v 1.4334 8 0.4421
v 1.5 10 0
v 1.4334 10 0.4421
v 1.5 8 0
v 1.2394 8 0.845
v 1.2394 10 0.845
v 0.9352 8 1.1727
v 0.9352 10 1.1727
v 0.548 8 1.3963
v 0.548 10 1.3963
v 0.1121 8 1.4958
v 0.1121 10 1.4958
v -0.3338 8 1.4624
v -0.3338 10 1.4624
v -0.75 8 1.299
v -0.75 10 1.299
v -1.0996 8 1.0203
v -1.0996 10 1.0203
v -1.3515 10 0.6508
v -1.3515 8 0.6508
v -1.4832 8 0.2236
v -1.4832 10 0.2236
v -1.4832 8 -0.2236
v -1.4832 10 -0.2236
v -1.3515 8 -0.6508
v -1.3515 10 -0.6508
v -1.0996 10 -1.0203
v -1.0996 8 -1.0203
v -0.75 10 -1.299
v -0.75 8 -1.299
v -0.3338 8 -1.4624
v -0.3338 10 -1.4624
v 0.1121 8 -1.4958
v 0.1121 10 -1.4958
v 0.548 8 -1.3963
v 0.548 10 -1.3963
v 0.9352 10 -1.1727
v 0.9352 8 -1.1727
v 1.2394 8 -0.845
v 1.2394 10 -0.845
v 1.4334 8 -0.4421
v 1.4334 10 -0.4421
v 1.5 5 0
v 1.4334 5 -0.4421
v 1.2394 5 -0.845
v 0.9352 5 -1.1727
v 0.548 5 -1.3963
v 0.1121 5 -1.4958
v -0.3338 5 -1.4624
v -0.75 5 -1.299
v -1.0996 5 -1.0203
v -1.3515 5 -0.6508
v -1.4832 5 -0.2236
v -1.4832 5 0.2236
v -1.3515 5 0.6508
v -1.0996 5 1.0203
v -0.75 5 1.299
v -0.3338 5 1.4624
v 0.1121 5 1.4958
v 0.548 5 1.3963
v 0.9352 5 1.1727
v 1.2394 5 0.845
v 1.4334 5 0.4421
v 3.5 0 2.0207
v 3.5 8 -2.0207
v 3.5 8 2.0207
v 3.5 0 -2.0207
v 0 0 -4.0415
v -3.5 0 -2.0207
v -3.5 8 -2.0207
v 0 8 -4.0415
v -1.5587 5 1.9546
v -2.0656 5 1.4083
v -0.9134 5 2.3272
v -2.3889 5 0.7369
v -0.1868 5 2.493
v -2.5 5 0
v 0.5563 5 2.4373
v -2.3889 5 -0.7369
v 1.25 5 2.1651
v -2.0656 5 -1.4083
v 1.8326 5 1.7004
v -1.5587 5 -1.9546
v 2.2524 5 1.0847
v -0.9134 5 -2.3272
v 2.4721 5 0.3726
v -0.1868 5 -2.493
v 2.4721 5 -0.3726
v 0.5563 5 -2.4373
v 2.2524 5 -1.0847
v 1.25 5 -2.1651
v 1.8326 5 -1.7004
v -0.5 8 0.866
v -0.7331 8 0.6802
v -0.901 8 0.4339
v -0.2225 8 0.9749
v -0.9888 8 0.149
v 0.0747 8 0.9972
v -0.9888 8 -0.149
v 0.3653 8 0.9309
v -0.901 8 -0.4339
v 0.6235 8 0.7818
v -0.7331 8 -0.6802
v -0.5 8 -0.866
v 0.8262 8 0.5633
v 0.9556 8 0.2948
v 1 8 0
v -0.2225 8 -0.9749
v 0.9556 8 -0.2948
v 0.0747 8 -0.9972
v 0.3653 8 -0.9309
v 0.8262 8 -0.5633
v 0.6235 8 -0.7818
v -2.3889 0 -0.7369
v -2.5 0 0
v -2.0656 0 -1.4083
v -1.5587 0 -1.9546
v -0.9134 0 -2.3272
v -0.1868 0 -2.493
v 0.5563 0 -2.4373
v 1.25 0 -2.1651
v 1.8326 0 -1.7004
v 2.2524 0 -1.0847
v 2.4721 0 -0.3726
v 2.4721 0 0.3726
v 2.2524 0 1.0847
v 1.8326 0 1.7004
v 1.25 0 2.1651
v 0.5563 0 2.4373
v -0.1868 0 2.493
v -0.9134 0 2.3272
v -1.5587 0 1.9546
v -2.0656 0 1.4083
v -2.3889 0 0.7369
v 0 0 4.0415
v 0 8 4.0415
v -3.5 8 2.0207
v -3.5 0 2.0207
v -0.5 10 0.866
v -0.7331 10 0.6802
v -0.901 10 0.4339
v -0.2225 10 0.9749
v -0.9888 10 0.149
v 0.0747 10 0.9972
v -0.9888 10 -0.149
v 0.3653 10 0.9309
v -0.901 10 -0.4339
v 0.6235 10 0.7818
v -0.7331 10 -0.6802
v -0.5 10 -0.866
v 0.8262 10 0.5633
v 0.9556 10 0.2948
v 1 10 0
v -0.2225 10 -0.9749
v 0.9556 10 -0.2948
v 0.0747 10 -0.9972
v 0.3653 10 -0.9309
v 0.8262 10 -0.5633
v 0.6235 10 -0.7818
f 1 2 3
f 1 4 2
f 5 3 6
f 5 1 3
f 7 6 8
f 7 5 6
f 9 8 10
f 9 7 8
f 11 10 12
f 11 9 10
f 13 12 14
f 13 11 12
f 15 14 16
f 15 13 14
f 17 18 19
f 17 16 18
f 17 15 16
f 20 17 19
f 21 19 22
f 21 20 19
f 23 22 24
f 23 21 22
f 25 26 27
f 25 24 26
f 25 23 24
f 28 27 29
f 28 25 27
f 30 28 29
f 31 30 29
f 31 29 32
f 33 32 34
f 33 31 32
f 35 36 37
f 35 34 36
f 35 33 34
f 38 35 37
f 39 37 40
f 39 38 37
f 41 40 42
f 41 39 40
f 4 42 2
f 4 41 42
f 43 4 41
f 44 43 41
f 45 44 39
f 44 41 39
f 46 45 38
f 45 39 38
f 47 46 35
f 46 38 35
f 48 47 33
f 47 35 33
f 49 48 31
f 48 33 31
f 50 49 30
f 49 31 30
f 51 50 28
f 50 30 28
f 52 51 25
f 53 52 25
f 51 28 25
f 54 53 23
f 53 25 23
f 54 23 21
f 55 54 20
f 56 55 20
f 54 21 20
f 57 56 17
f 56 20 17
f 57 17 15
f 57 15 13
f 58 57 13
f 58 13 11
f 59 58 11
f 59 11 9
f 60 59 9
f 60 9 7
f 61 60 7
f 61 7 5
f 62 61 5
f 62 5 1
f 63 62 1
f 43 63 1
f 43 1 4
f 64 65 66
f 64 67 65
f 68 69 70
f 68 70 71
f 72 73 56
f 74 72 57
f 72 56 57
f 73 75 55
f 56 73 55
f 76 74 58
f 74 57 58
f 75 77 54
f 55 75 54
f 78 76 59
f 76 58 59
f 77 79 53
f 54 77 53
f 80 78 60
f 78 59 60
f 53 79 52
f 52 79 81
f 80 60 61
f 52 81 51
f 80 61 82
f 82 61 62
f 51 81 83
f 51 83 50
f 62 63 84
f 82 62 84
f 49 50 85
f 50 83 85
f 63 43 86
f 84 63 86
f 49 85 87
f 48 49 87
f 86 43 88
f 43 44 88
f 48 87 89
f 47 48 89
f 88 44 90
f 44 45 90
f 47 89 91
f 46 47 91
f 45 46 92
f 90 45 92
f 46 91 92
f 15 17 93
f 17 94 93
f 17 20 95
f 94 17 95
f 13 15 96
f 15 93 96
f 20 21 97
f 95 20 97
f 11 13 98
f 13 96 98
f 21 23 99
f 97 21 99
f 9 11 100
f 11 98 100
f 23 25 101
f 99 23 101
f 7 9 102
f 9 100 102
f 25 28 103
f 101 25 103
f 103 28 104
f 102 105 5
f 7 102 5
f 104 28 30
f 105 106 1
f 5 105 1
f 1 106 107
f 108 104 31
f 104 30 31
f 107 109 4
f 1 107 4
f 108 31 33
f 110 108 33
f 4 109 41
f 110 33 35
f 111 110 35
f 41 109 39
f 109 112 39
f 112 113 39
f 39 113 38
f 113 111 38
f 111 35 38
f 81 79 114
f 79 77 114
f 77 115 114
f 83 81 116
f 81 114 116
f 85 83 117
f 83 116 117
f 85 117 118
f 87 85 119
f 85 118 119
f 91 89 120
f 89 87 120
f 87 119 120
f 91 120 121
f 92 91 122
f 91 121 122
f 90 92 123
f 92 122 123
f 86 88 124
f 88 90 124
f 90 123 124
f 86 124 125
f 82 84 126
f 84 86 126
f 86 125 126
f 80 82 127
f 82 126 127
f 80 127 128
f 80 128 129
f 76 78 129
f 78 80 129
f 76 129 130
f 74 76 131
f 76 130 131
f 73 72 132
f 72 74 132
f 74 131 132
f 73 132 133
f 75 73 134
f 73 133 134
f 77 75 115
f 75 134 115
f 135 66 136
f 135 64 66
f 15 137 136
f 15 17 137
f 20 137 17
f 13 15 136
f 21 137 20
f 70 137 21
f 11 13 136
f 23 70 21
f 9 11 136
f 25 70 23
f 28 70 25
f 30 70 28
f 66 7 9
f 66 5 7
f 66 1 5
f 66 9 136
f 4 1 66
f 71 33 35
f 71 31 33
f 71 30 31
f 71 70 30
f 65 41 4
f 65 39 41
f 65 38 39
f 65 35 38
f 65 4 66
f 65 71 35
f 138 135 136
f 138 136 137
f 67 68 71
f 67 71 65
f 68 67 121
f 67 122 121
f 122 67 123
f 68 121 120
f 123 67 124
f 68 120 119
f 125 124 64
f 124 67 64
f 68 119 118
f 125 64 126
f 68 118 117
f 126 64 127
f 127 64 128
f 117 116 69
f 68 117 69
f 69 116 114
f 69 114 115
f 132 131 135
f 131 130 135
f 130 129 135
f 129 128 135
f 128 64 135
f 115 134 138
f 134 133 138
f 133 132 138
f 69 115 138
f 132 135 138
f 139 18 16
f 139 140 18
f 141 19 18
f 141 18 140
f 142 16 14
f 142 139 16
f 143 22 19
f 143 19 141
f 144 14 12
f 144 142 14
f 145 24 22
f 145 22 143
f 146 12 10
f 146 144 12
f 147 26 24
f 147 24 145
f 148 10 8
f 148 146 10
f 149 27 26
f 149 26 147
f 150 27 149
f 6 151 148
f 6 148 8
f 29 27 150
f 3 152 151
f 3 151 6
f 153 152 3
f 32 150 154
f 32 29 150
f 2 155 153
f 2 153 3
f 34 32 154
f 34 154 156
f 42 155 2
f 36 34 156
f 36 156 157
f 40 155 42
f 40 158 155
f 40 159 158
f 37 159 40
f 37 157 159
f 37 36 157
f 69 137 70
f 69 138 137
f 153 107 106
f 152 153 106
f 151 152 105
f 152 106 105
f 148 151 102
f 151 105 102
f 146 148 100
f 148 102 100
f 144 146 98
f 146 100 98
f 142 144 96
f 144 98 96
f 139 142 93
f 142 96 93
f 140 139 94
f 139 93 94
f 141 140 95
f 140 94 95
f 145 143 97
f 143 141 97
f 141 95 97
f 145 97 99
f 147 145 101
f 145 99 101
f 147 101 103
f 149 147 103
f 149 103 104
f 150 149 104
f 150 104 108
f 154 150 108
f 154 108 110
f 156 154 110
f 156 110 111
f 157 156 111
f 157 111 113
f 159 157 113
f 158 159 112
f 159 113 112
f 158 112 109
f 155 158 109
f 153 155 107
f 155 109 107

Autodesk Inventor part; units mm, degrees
ref_plane "YZ Plane" through (0, 0, 0) normal (1, 0, 0) x (0, 1, 0)
ref_plane "XZ Plane" through (0, 0, 0) normal (0, 1, 0) x (-1, 0, 0)
ref_plane "XY Plane" through (0, 0, 0) normal (0, 0, 1) x (1, 0, 0)
sketch "Sketch1" plane through (0, 0, 0) normal (0, 1, 0) x (-1, 0, 0)
  line L0 (3.5, -2.0207) -> (0, -4.0415)
  line L1 (0, -4.0415) -> (-3.5, -2.0207)
  line L2 (-3.5, -2.0207) -> (-3.5, 2.0207)
  line L3 (-3.5, 2.0207) -> (0, 4.0415)
  line L4 (0, 4.0415) -> (3.5, 2.0207)
  line L5 (3.5, 2.0207) -> (3.5, -2.0207)
  circle A0 centre (0, 0) radius 2.5
  point P0 (3.5, 0)
  dimension "d1" = 5
extrude "Extrusion1" add sketch "Sketch1" along normal blind 5
thread "Thread1" size "M5x0.8" class "6H" standard "ANSI Metric M Profile" full length
sketch "Sketch2" plane through (0, 5, 0) normal (0, 1, 0) x (1, 0, 0)
  circle A0 centre (0, 0) radius 2.5 projected
  line L0 (-3.5, 2.0207) -> (-3.5, -2.0207) projected
  line L1 (-3.5, 2.0207) -> (0, 4.0415)
  line L2 (0, 4.0415) -> (3.5, 2.0207)
  line L3 (3.5, 2.0207) -> (3.5, -2.0207)
  line L4 (3.5, -2.0207) -> (0, -4.0415)
  line L5 (0, -4.0415) -> (-3.5, -2.0207)
  line L6 (-3.5, -2.0207) -> (-3.5, 2.0207)
  point P0 (-3.5, 0)
extrude "Extrusion2" add sketch "Sketch2" along normal blind 3 contours A0 | L1 L2 L3 L4 L5 L0
sketch "Sketch3" plane through (0, 8, 0) normal (0, 1, 0) x (1, 0, 0)
  circle A0 centre (0, 0) radius 1
  circle A1 centre (0, 0) radius 1.5
  dimension "d8" = 2
  dimension "d9" = 3
extrude "Extrusion3" add sketch "Sketch3" along normal blind 2
extrude "Extrusion4" cut sketch "Sketch3" against normal up to next contours A0 | A1
properties part number "pipeJoint"
